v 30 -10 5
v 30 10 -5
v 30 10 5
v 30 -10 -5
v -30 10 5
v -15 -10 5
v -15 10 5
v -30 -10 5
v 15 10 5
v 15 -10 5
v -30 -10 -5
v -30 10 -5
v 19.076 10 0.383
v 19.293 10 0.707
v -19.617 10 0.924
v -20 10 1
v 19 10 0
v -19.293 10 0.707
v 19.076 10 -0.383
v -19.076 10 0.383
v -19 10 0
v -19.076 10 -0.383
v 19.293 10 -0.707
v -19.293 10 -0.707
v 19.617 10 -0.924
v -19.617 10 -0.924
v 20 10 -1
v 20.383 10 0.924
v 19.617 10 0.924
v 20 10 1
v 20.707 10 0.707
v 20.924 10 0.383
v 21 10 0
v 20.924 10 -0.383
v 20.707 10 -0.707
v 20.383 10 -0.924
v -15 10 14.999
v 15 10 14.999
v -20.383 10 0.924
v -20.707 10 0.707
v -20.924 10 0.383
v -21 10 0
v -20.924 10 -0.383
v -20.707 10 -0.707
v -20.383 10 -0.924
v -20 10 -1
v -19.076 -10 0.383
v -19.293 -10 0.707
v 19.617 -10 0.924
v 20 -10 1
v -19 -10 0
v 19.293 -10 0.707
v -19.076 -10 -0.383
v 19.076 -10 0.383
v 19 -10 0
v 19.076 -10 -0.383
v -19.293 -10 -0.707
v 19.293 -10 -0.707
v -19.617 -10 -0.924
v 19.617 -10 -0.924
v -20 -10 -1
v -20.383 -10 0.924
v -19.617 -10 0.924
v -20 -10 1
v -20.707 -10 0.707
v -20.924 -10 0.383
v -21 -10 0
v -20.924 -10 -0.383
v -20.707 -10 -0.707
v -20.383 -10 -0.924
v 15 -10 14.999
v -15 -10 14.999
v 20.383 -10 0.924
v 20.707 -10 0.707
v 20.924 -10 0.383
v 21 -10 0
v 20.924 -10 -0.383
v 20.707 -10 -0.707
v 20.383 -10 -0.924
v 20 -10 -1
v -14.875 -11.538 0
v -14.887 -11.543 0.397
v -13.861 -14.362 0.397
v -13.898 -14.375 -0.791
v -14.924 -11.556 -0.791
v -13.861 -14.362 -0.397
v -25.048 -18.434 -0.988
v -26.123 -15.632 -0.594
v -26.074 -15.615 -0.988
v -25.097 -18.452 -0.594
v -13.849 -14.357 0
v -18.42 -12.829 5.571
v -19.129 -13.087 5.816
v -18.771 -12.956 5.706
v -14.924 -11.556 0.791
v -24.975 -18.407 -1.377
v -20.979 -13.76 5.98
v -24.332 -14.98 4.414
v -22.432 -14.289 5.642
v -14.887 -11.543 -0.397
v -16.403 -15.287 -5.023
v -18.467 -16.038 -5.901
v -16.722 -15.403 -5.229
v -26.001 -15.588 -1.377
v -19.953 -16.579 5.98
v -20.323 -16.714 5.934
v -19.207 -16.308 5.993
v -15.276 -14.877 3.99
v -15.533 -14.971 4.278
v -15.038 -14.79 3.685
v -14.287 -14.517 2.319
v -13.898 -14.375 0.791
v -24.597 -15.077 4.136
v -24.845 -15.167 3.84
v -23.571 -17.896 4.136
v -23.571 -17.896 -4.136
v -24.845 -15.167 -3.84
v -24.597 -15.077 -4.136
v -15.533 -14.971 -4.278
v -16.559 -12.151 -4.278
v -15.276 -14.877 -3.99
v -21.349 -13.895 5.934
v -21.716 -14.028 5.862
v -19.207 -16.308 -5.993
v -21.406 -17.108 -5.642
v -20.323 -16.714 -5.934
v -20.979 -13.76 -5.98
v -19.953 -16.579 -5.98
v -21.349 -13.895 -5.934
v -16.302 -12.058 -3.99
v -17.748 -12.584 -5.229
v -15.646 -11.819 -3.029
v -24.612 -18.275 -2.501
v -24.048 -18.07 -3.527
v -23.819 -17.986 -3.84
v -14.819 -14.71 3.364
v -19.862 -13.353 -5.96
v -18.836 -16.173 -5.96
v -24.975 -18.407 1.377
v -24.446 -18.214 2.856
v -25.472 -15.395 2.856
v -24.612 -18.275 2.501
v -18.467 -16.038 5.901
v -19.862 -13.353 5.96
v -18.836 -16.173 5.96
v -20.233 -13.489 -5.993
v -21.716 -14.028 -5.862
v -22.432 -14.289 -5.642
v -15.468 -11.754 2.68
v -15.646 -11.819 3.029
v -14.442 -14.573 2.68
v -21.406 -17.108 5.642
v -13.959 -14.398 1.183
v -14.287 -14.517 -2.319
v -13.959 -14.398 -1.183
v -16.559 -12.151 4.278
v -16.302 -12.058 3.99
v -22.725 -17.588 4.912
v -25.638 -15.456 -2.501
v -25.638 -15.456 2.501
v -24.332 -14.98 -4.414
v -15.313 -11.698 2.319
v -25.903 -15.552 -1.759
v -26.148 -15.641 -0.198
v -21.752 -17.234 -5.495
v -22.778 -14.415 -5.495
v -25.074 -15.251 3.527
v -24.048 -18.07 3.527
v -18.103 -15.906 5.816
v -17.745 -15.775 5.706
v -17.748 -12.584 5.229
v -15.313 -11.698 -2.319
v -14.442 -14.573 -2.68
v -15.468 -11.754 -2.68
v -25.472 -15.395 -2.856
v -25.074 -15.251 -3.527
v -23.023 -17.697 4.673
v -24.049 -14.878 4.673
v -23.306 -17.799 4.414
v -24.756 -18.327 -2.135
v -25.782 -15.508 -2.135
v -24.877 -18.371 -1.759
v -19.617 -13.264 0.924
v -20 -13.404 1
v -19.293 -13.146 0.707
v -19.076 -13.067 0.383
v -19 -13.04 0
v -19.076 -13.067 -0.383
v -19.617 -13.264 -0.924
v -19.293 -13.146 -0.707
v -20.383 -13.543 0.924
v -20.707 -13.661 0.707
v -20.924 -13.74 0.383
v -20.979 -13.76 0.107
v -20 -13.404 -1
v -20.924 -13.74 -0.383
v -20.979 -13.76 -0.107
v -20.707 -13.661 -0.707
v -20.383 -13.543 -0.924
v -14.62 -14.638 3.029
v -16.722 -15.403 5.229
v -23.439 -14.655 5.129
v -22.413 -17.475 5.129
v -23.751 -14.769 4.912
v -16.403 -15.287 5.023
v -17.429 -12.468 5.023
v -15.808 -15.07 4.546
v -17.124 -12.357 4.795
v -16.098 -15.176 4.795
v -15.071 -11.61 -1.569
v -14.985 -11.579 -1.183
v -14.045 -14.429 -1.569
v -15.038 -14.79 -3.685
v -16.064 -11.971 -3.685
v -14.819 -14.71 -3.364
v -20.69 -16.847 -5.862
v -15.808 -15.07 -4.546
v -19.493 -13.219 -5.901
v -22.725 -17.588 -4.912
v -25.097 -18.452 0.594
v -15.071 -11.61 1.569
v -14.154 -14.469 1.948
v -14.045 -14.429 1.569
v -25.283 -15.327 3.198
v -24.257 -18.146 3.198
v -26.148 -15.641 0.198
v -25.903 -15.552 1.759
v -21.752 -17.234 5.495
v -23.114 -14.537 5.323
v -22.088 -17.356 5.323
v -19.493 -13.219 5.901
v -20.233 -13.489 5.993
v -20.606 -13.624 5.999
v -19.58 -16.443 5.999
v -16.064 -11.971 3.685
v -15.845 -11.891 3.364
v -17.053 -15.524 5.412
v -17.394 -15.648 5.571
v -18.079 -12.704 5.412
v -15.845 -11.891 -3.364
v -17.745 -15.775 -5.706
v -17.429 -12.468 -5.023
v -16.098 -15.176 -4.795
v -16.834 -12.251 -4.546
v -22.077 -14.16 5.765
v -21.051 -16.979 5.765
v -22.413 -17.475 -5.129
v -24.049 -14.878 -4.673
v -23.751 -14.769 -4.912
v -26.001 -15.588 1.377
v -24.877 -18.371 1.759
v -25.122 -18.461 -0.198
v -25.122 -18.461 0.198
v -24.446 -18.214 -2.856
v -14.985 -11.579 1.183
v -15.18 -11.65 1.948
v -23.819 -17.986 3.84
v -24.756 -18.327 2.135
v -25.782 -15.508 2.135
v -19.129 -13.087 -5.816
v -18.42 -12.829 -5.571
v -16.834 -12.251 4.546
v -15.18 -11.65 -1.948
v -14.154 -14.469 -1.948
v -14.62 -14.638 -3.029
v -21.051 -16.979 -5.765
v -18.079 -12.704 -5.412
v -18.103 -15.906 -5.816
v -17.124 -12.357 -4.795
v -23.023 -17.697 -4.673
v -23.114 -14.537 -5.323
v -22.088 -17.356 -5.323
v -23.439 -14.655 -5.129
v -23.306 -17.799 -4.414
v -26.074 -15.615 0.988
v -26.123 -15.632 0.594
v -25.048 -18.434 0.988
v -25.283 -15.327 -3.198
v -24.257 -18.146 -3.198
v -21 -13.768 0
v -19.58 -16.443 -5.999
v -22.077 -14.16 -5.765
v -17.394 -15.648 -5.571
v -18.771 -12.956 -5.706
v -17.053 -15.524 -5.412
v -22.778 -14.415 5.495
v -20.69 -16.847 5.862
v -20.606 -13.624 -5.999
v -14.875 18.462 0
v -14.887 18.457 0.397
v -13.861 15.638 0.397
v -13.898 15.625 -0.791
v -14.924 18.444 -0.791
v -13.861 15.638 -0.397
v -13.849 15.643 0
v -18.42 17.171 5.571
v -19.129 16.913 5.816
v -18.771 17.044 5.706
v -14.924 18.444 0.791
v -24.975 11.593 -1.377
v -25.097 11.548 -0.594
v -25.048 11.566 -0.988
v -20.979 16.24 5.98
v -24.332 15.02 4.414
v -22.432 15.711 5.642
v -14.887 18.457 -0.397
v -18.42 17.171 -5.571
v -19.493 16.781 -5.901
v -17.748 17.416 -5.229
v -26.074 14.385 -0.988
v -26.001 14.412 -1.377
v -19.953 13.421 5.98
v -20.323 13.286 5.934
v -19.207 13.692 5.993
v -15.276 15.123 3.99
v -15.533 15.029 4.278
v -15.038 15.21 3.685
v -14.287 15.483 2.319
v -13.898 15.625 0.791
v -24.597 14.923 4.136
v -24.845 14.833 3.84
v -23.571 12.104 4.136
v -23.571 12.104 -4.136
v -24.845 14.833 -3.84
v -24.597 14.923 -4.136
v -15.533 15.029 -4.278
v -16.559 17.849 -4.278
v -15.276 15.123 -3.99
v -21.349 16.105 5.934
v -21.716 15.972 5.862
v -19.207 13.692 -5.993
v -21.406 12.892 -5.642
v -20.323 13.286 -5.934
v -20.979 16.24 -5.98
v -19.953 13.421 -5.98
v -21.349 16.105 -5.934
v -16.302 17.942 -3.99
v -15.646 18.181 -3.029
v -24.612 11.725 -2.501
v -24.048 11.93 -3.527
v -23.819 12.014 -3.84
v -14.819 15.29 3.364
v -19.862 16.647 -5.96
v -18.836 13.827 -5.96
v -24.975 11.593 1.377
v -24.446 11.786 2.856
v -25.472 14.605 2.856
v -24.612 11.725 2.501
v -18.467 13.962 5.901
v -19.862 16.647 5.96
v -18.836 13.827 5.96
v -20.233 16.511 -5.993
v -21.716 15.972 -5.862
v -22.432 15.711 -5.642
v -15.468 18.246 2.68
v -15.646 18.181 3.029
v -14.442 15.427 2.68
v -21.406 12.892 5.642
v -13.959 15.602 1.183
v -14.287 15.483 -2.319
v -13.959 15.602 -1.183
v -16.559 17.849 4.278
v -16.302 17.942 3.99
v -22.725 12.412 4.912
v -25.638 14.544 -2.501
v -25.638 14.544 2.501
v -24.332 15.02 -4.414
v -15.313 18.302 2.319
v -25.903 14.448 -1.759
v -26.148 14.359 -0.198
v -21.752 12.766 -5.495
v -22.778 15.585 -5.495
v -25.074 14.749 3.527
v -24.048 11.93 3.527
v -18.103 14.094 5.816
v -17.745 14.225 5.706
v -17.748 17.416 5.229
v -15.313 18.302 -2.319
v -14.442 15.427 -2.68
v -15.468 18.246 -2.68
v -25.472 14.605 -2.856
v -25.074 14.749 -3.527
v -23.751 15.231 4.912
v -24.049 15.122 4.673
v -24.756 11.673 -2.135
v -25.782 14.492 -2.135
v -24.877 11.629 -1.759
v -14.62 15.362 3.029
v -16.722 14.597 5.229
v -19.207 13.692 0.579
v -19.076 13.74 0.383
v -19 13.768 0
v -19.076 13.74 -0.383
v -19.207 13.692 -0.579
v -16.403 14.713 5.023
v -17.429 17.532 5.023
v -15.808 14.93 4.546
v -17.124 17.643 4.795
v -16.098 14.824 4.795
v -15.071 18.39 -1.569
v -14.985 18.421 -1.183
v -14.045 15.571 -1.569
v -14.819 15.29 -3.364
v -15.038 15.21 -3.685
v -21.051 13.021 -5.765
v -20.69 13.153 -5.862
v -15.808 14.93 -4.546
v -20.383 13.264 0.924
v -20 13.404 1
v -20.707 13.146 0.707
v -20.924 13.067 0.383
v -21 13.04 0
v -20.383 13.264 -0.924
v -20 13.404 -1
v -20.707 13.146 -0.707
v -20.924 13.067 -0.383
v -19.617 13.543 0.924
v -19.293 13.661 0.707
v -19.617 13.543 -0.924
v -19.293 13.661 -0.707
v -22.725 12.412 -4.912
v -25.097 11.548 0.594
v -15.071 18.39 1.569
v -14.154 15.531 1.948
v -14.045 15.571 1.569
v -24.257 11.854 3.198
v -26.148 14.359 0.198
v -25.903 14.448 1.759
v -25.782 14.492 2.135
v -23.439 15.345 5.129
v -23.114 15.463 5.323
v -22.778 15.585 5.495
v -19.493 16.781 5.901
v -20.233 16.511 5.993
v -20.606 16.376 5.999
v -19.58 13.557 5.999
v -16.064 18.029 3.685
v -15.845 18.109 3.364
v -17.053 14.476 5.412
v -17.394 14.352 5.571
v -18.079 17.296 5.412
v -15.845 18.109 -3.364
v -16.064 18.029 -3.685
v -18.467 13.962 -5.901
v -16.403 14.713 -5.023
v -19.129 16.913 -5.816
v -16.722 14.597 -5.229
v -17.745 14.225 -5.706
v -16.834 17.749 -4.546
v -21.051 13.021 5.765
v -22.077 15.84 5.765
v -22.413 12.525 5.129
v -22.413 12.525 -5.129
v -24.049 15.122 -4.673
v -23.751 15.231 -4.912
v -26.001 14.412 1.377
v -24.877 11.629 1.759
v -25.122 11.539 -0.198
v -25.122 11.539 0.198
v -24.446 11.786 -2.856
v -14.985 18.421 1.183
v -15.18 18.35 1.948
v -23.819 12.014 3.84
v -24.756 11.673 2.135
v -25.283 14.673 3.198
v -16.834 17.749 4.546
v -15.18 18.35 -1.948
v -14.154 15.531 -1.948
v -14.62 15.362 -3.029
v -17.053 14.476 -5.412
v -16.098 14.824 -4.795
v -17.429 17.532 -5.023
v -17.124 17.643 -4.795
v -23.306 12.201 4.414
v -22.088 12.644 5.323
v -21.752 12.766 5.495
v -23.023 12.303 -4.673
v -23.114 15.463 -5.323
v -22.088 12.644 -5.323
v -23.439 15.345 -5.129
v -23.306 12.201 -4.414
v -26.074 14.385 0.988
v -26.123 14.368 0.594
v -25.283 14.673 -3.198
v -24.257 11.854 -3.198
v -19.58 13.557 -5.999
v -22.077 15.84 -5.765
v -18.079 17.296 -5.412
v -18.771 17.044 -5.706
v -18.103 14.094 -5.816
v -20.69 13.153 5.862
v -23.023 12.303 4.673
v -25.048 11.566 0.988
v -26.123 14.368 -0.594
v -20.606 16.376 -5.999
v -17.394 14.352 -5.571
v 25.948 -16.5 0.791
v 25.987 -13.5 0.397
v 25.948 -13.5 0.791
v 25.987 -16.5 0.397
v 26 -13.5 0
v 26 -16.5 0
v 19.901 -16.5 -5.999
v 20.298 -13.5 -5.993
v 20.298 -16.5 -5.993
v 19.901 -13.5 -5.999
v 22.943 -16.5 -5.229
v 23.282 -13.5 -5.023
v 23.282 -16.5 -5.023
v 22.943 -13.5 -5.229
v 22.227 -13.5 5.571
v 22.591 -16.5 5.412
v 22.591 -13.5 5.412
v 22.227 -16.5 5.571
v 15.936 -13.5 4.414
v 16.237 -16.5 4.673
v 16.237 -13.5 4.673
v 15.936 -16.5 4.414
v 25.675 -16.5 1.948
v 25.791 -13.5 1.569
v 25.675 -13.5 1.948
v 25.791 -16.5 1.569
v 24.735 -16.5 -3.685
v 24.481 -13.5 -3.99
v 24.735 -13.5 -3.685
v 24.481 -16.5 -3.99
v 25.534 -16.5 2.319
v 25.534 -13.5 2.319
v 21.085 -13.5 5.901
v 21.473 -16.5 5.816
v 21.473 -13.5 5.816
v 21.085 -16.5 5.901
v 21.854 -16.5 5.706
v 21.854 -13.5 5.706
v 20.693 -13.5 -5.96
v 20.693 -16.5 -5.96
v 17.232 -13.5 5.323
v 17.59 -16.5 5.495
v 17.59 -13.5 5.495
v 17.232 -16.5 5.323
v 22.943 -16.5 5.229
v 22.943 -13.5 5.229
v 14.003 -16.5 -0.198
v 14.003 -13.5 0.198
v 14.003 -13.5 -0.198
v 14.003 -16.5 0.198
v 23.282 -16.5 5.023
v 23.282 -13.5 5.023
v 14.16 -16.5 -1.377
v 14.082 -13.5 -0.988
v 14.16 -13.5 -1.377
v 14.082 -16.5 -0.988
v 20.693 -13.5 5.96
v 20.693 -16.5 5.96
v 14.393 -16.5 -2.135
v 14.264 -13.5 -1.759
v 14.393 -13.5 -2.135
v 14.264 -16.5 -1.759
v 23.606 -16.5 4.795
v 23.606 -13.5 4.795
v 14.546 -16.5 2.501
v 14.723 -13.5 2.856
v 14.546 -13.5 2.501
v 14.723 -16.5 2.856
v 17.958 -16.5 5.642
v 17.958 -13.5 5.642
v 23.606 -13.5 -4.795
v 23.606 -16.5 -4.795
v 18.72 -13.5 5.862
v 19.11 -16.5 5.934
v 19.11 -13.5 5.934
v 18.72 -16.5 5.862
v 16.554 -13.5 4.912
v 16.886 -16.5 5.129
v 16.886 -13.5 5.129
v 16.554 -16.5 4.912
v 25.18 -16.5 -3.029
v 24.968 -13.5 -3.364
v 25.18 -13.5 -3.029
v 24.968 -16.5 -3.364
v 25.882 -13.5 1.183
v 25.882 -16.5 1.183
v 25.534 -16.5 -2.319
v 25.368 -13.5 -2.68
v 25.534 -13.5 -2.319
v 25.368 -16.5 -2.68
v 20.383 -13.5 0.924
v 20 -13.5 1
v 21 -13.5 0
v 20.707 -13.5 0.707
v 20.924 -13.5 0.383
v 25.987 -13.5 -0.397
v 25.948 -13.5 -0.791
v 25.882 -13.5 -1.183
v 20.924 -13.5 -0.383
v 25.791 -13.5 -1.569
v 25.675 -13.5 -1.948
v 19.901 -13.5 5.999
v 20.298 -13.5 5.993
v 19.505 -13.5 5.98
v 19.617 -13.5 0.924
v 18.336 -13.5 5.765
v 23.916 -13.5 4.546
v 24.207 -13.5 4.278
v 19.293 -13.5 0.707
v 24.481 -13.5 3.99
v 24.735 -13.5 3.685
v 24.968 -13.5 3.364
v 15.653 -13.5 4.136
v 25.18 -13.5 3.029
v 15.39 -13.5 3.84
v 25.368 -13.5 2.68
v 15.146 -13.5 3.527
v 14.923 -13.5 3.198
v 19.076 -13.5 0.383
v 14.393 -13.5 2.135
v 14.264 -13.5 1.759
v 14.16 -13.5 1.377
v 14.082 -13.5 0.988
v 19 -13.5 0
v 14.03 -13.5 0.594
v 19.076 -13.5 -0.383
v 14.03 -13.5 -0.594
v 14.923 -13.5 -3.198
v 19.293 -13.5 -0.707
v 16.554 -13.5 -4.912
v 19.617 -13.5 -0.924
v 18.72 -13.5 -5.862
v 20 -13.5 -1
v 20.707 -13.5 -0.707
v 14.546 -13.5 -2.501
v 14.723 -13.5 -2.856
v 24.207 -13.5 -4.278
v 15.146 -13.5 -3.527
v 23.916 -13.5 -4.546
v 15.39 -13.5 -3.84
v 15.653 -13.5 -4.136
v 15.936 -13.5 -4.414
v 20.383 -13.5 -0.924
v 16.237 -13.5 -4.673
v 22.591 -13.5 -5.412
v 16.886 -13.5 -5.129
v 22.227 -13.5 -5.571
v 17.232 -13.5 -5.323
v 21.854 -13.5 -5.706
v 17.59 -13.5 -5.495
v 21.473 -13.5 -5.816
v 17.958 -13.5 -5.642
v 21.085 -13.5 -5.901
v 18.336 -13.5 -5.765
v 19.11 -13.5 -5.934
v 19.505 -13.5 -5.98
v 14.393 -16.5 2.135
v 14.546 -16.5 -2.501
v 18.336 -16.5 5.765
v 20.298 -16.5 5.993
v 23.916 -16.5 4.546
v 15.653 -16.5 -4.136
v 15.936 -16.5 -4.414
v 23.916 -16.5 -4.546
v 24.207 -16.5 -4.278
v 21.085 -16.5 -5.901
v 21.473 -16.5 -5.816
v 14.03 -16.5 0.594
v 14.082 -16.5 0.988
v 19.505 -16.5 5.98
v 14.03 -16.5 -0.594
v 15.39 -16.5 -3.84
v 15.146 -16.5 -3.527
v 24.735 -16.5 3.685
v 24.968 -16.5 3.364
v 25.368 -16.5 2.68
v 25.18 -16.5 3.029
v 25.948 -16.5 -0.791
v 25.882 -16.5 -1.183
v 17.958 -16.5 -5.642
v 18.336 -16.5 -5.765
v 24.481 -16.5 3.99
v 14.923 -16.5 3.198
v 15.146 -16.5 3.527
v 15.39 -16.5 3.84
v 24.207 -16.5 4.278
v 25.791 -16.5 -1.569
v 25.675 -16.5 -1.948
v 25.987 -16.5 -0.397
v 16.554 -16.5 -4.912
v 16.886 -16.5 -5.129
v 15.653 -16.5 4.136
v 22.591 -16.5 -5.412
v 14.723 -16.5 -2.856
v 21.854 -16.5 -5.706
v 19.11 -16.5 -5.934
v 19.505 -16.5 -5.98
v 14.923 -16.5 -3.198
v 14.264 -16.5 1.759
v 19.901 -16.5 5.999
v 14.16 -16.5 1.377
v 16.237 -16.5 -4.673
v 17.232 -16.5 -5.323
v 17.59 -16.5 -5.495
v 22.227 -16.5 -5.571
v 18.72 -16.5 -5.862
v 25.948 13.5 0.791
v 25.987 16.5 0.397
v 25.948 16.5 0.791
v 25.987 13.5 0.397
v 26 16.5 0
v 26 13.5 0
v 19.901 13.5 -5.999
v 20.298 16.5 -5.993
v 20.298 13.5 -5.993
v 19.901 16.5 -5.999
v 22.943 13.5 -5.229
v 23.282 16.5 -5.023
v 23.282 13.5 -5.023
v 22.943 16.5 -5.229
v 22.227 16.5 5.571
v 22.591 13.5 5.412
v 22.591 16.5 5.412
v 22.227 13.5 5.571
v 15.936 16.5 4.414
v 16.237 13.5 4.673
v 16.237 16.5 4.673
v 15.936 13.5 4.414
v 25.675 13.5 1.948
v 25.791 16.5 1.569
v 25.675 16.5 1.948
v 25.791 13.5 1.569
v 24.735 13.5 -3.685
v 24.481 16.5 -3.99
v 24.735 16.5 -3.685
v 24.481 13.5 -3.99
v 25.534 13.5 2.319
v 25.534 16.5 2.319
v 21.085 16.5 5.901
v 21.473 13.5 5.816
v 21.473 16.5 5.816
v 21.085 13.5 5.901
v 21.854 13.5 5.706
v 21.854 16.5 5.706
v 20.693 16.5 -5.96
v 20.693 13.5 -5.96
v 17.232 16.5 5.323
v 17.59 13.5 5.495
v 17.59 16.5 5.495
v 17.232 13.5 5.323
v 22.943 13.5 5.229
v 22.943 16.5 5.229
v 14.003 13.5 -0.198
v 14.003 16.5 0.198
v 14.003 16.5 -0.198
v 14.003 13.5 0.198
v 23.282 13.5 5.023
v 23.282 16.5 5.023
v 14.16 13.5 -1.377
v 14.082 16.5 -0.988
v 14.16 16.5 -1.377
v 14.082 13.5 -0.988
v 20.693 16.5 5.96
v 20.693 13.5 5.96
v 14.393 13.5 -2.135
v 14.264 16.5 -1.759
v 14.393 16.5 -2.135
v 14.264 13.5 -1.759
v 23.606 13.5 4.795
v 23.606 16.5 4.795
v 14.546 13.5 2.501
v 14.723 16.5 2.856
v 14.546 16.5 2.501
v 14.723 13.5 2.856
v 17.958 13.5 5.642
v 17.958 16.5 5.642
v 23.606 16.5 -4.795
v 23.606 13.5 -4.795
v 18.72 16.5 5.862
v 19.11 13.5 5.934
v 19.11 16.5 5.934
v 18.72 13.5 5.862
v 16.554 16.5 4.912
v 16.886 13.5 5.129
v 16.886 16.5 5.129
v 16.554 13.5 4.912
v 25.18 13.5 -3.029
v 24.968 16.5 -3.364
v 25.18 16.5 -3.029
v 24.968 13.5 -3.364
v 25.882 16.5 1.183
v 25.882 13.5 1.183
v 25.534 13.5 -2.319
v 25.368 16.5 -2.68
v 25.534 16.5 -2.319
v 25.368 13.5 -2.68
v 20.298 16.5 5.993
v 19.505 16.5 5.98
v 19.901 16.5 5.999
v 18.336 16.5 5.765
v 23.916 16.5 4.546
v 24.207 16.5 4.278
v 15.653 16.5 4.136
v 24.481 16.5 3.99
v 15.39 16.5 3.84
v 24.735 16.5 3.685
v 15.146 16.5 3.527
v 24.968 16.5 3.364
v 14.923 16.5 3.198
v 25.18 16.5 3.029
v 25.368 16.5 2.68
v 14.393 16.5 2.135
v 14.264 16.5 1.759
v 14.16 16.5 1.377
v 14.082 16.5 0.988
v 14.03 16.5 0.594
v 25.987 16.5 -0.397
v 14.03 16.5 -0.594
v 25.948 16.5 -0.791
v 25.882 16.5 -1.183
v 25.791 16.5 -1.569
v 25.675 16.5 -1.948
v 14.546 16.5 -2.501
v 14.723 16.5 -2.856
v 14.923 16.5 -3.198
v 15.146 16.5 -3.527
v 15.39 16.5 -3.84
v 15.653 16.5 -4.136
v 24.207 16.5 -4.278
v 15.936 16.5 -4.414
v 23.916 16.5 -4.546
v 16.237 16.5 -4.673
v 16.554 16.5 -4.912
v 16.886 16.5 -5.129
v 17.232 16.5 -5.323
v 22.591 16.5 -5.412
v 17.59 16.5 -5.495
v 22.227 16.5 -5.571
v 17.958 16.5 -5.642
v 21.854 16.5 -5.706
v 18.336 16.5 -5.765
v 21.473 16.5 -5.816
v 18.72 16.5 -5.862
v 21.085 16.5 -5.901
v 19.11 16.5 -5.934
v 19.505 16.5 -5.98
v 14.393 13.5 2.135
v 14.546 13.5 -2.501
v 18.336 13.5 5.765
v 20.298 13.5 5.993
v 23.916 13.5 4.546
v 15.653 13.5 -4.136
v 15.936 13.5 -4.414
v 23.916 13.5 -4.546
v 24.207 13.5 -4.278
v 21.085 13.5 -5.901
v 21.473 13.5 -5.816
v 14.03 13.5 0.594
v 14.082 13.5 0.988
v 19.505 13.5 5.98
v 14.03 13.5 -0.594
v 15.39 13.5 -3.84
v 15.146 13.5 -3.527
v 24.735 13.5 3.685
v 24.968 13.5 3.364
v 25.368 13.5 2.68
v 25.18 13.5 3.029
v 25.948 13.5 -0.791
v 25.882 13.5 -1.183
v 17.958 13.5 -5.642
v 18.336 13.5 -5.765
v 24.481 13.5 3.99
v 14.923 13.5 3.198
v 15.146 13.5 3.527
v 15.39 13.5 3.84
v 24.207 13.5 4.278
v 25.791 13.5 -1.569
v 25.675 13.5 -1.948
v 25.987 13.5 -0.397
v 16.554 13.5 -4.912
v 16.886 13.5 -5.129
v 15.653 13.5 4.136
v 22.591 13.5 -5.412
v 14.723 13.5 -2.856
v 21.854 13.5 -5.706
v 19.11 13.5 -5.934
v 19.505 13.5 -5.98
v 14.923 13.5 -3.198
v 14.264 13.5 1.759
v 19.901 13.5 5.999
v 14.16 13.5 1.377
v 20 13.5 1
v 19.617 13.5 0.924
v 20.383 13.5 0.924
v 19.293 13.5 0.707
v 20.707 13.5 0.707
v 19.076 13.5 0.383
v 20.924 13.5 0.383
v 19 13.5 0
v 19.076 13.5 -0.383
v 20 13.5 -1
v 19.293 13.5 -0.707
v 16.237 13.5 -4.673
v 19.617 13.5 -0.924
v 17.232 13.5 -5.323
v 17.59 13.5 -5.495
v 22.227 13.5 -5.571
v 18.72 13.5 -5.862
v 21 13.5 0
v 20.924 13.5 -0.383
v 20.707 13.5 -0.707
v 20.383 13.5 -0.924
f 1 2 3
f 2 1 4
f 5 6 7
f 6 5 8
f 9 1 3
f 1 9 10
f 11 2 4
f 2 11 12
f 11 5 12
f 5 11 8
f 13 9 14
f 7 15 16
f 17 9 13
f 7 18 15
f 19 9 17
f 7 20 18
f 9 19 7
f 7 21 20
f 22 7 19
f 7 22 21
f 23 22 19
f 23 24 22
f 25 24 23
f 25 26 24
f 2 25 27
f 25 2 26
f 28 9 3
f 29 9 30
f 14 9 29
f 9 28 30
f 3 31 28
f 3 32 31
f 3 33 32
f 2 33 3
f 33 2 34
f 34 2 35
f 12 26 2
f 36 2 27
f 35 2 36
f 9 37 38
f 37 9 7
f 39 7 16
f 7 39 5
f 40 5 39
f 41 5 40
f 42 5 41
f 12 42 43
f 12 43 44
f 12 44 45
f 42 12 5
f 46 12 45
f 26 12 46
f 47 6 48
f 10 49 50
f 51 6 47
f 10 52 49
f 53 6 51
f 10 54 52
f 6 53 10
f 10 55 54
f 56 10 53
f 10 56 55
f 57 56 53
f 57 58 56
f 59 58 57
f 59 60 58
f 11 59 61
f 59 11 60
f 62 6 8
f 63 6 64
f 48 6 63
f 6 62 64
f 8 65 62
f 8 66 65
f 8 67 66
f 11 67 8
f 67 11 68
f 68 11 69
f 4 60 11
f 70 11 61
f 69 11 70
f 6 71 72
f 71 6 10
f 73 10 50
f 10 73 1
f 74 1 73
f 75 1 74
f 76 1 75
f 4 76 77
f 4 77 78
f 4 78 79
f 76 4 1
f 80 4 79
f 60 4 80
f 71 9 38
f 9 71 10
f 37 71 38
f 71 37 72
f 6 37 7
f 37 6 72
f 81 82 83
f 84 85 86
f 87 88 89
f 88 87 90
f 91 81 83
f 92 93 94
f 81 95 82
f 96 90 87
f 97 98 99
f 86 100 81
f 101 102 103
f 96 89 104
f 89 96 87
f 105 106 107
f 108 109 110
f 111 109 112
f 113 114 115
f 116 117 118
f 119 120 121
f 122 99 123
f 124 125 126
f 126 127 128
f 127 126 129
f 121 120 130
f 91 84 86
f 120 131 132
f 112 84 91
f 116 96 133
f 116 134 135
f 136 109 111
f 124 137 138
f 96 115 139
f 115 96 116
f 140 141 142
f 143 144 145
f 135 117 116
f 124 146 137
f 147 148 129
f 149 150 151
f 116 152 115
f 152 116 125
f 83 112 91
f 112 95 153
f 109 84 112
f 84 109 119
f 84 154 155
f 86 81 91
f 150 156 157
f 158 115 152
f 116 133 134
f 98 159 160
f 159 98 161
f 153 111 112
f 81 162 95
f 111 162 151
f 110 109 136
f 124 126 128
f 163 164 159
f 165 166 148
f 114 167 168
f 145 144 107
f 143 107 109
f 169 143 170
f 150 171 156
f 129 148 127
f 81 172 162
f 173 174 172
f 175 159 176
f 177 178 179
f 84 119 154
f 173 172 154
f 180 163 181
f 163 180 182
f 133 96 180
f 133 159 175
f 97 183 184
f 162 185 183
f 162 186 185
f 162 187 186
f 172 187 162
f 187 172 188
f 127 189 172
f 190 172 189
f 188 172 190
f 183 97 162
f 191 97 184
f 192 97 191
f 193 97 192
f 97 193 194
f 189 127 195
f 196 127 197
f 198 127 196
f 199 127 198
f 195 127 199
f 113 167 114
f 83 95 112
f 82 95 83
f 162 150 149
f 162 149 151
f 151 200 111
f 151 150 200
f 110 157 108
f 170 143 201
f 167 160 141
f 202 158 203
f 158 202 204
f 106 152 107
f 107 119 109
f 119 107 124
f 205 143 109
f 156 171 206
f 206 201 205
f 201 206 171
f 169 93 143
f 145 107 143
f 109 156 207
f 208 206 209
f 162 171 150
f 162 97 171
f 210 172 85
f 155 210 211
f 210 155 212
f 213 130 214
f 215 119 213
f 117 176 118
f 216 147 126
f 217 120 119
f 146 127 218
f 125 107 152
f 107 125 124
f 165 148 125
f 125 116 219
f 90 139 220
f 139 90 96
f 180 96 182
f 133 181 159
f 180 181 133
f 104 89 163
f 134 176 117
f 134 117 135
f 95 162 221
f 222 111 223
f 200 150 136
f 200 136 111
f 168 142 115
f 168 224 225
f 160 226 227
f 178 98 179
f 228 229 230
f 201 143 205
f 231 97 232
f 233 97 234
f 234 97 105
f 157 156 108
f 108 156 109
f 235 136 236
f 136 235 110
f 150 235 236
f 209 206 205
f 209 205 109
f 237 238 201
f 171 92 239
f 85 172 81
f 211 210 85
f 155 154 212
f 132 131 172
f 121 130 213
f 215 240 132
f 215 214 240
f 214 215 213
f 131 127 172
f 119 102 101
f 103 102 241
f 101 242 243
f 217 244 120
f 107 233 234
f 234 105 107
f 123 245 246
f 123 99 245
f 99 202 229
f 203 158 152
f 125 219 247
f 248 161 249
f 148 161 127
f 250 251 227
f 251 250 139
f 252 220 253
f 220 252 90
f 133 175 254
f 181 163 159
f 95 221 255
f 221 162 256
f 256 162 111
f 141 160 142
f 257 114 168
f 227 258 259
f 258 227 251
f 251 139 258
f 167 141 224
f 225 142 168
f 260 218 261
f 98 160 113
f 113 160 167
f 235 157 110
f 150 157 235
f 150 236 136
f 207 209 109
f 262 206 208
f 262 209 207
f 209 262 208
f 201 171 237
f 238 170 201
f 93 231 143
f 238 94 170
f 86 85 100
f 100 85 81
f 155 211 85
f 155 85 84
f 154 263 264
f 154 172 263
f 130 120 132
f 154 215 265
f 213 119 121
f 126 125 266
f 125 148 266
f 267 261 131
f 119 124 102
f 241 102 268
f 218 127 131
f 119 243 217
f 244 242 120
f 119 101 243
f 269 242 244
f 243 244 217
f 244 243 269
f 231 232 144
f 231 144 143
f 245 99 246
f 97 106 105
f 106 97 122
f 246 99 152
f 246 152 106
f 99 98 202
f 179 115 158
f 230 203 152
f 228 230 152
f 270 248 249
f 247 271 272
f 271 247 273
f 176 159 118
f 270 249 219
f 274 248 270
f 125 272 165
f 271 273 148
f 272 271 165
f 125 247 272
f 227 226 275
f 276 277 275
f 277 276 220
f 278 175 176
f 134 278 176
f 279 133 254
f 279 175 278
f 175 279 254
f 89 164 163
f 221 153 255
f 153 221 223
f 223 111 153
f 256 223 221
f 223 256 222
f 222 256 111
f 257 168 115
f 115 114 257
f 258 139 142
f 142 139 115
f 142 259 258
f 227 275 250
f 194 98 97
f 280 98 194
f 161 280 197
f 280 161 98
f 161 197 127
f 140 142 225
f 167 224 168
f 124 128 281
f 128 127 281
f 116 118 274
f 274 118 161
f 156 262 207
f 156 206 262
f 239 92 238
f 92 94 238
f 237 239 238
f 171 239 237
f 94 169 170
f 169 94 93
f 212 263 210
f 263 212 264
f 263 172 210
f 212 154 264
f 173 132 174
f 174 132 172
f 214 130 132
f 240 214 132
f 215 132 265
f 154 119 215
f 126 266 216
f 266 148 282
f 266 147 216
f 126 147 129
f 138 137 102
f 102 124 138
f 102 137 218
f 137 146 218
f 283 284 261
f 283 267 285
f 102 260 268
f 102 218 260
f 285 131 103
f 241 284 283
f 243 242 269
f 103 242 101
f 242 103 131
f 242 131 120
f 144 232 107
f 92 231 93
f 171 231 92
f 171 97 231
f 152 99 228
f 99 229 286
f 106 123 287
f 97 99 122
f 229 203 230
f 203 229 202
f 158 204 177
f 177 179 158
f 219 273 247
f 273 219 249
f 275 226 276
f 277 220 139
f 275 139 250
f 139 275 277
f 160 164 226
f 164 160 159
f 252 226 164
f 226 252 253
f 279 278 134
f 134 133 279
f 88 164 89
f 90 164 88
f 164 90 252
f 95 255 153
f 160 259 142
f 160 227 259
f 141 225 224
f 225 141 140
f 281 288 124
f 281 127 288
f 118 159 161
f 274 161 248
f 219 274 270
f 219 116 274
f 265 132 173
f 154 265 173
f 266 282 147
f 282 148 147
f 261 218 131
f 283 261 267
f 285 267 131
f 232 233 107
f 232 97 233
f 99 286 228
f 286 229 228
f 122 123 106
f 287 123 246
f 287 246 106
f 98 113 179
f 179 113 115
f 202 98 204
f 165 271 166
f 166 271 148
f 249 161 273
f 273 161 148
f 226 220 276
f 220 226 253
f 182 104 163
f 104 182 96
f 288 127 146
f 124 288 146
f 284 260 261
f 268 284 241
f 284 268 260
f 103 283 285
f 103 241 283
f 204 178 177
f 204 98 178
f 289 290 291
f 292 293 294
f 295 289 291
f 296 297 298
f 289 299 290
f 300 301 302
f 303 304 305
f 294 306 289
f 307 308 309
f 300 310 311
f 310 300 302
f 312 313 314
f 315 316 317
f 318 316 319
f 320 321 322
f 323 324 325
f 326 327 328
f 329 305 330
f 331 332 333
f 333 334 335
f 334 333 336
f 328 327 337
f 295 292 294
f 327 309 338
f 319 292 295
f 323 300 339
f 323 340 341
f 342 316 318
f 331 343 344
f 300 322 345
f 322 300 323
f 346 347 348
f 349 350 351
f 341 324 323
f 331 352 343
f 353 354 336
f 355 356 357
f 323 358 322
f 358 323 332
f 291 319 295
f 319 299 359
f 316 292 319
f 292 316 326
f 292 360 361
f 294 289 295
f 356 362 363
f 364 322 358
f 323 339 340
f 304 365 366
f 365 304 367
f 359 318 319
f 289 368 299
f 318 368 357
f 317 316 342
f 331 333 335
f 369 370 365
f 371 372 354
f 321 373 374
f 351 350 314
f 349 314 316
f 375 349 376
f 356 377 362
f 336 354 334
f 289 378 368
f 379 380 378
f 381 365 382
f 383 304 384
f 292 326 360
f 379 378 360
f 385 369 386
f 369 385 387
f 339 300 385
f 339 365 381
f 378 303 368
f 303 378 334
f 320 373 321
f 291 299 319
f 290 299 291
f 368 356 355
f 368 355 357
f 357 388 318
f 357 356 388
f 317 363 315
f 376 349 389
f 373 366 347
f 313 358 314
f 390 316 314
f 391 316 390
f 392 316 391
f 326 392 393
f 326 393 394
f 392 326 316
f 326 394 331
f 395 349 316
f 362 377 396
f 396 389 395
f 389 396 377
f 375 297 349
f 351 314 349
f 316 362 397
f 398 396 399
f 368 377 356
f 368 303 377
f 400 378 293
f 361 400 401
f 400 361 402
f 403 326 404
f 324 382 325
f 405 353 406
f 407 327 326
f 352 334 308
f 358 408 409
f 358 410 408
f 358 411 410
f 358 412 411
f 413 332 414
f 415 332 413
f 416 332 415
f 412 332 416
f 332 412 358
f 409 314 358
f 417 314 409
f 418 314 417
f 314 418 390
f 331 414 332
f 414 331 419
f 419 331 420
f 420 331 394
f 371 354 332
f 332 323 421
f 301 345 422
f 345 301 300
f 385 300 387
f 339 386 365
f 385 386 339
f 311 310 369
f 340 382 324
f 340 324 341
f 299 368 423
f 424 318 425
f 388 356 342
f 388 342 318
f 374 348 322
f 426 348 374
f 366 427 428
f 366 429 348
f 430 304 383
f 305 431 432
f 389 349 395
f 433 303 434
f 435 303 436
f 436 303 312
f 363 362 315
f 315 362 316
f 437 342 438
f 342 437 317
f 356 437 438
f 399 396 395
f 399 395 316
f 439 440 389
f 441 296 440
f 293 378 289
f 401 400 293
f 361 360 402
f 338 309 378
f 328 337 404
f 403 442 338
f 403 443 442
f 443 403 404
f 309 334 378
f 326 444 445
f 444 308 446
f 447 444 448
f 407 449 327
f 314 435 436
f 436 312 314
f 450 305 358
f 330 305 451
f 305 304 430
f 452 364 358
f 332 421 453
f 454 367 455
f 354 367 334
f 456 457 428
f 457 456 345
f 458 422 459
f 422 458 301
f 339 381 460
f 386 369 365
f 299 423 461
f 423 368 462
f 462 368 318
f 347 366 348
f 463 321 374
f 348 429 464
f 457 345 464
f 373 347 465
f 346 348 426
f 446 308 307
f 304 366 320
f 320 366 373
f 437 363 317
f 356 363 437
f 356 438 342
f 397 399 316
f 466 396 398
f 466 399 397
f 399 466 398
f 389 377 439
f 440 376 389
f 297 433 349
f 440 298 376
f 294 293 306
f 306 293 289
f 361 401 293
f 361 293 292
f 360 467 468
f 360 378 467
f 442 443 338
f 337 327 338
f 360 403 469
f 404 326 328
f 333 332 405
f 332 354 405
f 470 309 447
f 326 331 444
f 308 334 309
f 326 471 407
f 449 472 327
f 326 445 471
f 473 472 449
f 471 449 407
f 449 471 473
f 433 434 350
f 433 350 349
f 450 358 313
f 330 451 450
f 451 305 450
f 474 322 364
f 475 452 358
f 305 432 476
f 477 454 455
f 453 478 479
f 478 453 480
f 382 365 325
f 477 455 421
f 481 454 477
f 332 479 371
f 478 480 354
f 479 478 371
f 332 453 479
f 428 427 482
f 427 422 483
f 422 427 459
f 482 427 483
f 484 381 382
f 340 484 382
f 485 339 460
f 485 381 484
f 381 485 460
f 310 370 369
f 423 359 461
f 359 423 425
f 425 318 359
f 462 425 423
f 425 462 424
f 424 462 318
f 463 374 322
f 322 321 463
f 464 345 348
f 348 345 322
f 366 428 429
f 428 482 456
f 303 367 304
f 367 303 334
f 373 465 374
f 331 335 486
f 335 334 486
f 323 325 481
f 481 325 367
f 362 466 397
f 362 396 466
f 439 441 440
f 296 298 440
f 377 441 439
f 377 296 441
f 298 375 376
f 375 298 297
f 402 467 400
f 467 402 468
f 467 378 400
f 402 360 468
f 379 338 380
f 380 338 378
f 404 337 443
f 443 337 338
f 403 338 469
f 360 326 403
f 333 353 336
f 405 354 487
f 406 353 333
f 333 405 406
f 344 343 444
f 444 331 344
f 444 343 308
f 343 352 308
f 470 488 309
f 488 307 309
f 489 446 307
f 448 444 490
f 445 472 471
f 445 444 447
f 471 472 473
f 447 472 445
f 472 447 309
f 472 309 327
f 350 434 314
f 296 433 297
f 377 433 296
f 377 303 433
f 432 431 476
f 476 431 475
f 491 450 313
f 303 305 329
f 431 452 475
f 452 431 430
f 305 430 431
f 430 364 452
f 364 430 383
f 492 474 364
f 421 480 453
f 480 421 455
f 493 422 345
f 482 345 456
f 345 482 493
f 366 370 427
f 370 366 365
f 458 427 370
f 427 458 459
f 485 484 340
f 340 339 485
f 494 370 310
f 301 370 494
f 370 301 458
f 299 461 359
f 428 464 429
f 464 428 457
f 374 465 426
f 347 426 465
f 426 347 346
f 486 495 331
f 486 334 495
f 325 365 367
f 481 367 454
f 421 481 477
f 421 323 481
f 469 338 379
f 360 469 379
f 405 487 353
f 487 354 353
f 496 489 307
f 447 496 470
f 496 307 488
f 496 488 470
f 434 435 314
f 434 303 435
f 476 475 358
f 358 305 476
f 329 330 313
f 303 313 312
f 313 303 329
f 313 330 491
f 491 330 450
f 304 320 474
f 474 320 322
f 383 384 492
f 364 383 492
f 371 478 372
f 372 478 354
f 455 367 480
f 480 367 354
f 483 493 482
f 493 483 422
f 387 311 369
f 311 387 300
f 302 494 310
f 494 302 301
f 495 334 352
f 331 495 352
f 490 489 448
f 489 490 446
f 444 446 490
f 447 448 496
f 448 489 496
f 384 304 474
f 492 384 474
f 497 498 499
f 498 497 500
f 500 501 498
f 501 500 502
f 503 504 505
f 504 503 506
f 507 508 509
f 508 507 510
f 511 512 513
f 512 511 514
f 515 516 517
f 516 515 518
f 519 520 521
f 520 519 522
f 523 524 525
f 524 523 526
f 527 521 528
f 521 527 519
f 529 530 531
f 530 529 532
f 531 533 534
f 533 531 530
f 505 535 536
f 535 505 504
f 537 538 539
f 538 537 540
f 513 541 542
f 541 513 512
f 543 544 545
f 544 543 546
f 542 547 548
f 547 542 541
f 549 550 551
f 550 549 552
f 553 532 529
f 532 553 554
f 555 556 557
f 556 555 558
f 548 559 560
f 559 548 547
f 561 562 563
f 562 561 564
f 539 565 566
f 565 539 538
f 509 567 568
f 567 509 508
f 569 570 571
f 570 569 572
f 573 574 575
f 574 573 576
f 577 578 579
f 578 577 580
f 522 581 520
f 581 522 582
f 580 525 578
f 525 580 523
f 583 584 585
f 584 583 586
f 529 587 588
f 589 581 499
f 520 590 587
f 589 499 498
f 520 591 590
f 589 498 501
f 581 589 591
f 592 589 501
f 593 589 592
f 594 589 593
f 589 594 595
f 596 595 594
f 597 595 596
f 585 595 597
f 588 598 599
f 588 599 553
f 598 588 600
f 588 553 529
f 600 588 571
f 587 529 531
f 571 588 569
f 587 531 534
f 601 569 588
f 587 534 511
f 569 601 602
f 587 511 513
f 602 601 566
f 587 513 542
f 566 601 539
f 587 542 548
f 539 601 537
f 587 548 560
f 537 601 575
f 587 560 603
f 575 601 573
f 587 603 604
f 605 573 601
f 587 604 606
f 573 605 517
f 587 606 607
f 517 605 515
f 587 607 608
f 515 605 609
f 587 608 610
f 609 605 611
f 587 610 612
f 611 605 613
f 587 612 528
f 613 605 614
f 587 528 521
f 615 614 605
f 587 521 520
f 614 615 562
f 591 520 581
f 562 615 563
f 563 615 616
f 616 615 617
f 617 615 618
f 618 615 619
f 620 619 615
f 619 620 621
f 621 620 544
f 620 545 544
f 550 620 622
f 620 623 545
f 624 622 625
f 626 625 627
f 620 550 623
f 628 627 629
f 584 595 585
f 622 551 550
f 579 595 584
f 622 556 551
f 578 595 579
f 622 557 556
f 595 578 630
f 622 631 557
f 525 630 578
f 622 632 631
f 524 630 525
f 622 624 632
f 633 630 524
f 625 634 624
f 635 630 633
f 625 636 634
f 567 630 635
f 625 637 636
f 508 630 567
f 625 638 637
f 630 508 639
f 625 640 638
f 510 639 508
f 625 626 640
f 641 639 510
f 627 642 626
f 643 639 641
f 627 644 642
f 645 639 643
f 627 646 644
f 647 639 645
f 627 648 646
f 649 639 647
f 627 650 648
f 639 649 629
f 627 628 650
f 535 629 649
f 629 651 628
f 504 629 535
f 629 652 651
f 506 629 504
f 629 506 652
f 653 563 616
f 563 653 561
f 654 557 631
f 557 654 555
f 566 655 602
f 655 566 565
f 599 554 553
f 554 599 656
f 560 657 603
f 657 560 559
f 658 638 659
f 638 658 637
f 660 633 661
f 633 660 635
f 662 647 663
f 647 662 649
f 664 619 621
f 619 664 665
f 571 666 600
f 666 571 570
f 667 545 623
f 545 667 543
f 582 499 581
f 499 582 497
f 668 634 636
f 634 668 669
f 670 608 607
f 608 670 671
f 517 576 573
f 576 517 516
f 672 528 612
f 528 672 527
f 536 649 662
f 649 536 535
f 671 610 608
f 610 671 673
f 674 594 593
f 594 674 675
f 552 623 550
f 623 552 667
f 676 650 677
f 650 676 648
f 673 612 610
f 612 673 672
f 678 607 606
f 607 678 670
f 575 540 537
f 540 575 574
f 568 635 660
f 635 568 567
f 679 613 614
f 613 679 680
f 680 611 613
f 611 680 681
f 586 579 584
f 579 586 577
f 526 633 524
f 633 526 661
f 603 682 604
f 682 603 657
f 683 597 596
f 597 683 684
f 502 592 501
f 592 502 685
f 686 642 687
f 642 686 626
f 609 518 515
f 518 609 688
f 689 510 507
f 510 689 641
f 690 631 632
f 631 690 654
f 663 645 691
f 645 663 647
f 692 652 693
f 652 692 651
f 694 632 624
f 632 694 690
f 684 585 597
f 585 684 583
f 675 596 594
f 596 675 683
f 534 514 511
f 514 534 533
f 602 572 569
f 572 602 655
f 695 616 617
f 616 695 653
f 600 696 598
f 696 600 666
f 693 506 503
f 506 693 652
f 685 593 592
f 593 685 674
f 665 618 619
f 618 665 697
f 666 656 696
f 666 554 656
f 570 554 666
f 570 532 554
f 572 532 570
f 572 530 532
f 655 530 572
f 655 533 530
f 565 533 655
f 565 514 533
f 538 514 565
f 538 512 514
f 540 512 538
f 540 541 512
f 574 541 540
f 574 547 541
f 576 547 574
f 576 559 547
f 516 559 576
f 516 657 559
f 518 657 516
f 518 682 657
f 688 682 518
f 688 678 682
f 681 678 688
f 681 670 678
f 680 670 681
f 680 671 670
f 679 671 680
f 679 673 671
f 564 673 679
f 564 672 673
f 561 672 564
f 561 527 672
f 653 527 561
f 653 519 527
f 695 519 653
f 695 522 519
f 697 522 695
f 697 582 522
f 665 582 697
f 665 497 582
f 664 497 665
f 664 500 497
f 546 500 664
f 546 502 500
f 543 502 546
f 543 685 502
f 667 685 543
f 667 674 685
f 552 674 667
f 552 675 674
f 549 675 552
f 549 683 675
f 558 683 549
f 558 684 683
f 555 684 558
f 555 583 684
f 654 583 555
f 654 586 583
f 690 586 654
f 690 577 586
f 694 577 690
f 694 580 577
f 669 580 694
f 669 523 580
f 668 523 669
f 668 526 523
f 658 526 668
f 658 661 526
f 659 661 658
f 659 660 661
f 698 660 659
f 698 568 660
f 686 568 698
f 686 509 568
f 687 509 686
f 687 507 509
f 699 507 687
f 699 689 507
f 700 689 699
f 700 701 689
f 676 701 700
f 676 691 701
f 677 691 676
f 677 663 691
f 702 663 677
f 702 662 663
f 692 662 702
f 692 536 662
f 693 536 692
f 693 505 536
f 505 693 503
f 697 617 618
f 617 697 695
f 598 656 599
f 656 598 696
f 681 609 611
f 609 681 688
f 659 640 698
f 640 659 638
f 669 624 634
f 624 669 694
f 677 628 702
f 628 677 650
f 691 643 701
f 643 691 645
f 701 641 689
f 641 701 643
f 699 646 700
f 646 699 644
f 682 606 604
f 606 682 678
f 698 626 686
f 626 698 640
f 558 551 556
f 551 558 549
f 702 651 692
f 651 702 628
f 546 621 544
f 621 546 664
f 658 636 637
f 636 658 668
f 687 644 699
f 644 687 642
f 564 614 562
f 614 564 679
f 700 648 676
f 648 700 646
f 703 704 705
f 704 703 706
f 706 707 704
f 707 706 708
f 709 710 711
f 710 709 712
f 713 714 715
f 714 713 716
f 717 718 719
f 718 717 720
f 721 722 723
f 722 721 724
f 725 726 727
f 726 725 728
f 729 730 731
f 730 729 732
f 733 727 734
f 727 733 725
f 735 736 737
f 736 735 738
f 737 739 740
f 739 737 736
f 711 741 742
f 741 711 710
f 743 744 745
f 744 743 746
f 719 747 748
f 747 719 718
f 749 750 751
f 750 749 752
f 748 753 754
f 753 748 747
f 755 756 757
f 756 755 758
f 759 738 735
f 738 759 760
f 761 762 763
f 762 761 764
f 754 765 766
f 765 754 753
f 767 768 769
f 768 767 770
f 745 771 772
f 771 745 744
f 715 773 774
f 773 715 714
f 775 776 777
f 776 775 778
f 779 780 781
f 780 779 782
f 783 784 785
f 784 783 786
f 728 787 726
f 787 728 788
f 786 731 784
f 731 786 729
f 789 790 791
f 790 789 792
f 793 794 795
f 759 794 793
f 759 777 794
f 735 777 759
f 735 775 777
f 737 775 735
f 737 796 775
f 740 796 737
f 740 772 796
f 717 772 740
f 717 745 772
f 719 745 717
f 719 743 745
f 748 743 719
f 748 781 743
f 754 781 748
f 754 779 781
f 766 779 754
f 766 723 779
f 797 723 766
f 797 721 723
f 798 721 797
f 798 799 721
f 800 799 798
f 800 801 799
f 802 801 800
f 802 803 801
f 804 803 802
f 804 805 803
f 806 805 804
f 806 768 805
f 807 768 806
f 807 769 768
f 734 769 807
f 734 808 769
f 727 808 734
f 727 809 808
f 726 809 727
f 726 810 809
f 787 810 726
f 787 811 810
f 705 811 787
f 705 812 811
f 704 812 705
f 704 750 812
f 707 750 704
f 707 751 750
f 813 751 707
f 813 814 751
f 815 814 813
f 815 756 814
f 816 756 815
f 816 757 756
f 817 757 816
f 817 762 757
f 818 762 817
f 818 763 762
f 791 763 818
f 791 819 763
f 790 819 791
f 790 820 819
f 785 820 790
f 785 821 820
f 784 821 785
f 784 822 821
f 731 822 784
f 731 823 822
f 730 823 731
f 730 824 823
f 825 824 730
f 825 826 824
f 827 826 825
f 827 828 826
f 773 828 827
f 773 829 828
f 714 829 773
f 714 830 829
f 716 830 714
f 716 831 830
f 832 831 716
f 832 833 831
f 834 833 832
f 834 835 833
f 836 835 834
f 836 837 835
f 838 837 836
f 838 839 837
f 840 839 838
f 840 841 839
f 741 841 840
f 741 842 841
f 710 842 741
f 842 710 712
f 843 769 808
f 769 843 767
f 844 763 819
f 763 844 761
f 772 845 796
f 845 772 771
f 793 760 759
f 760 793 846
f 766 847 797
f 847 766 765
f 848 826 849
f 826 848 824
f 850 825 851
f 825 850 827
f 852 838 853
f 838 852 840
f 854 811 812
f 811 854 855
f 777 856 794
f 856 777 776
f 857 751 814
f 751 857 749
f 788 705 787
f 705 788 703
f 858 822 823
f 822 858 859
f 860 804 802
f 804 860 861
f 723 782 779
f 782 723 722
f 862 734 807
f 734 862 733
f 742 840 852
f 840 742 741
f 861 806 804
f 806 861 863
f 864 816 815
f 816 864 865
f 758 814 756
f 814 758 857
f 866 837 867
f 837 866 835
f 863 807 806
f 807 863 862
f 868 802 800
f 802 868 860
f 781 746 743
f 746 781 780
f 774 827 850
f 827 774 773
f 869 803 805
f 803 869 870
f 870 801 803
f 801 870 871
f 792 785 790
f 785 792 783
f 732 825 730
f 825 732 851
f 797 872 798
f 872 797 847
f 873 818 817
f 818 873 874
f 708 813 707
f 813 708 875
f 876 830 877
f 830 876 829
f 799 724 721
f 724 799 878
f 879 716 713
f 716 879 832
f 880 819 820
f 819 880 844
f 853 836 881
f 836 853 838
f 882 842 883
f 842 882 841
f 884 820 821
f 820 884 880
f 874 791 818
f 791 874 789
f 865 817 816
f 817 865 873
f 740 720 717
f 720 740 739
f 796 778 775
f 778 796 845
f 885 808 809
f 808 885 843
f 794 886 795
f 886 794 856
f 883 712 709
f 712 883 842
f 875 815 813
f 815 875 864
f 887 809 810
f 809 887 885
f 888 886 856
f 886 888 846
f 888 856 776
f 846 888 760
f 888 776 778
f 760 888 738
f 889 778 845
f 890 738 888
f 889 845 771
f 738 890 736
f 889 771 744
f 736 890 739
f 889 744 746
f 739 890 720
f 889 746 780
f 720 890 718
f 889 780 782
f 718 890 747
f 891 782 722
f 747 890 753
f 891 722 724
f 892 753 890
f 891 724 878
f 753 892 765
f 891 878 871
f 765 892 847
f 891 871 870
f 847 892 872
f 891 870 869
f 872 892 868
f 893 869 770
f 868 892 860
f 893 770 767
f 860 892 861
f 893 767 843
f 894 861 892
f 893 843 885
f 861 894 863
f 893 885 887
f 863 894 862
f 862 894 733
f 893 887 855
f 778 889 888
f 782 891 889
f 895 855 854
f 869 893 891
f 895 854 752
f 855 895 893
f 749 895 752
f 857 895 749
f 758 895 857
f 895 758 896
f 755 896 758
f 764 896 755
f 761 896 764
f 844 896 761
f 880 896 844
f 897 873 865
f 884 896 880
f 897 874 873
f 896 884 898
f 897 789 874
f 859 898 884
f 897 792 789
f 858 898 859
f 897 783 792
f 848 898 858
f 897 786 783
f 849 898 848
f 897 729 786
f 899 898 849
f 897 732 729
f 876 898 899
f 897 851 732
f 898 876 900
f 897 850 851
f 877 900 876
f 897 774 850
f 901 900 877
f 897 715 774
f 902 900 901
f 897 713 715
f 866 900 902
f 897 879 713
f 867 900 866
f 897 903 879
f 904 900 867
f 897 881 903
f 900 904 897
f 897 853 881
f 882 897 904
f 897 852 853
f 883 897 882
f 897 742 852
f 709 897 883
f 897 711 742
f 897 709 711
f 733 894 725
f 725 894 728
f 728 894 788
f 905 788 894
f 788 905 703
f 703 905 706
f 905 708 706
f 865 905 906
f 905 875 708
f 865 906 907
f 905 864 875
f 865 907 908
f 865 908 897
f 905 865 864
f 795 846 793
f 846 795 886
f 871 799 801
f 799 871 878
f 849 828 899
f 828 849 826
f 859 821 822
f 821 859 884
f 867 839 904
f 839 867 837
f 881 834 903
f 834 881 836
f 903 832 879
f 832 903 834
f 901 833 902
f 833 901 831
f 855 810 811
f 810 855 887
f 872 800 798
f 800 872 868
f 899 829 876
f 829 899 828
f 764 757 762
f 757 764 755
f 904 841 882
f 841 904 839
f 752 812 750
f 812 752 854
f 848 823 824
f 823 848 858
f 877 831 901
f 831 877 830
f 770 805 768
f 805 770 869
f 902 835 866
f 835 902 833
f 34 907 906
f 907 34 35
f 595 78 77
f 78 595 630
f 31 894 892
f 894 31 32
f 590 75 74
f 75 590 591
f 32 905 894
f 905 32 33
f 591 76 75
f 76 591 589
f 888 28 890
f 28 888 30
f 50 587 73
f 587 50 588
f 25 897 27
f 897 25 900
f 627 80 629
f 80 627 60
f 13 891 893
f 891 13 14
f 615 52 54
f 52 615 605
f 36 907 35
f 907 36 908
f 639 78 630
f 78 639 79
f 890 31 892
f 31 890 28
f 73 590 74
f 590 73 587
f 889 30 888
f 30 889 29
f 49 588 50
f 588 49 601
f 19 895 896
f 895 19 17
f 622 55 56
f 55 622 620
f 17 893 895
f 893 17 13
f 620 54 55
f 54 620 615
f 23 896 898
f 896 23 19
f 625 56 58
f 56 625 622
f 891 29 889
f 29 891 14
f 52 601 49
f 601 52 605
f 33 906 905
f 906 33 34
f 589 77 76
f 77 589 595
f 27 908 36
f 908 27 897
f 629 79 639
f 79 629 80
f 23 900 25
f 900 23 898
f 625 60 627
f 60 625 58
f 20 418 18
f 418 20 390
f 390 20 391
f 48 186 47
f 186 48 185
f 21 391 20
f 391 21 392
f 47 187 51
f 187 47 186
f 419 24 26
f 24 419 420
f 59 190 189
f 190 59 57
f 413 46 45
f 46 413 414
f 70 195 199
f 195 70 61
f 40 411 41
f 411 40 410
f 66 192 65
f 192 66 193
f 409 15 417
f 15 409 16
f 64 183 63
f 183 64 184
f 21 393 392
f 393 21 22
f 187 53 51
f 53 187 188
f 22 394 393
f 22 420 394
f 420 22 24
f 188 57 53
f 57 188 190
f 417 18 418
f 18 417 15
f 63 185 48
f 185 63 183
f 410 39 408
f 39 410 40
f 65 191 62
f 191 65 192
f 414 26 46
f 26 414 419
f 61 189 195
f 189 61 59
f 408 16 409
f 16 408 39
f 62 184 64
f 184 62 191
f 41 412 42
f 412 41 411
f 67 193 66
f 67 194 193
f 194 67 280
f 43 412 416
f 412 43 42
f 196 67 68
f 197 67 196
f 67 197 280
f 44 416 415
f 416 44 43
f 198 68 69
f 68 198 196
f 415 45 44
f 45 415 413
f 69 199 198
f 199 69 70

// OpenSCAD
$fa = 1;
$fs = 0.4;

wheelRadius = 6;
axleRadius = 1;

// car body
cube([60,20,10], center=true);

// car top
translate([0, 0, 10-.001])
cube([30,20,10], center=true);

// front left wheel
translate([-20, -15, 0])
rotate([90,0,20])
cylinder(h=3, r=wheelRadius, center=true);

translate([-20, 15, 0])
rotate([90,0,20])
cylinder(h=3, r=wheelRadius, center=true);

translate([20, -15, 0])
rotate([90,0,0])
cylinder(h=3, r=wheelRadius, center=true);

translate([20, 15, 0])
rotate([90,0,0])
cylinder(h=3, r=wheelRadius, center=true);

// front axle
translate([20, 0, 0])
rotate([90, 0, 0])
cylinder(h=30, r=axleRadius, center=true);

// rear axle
translate([-20, 0, 0])
rotate([90, 0, 0])
cylinder(h=30, r=axleRadius, center=true);
